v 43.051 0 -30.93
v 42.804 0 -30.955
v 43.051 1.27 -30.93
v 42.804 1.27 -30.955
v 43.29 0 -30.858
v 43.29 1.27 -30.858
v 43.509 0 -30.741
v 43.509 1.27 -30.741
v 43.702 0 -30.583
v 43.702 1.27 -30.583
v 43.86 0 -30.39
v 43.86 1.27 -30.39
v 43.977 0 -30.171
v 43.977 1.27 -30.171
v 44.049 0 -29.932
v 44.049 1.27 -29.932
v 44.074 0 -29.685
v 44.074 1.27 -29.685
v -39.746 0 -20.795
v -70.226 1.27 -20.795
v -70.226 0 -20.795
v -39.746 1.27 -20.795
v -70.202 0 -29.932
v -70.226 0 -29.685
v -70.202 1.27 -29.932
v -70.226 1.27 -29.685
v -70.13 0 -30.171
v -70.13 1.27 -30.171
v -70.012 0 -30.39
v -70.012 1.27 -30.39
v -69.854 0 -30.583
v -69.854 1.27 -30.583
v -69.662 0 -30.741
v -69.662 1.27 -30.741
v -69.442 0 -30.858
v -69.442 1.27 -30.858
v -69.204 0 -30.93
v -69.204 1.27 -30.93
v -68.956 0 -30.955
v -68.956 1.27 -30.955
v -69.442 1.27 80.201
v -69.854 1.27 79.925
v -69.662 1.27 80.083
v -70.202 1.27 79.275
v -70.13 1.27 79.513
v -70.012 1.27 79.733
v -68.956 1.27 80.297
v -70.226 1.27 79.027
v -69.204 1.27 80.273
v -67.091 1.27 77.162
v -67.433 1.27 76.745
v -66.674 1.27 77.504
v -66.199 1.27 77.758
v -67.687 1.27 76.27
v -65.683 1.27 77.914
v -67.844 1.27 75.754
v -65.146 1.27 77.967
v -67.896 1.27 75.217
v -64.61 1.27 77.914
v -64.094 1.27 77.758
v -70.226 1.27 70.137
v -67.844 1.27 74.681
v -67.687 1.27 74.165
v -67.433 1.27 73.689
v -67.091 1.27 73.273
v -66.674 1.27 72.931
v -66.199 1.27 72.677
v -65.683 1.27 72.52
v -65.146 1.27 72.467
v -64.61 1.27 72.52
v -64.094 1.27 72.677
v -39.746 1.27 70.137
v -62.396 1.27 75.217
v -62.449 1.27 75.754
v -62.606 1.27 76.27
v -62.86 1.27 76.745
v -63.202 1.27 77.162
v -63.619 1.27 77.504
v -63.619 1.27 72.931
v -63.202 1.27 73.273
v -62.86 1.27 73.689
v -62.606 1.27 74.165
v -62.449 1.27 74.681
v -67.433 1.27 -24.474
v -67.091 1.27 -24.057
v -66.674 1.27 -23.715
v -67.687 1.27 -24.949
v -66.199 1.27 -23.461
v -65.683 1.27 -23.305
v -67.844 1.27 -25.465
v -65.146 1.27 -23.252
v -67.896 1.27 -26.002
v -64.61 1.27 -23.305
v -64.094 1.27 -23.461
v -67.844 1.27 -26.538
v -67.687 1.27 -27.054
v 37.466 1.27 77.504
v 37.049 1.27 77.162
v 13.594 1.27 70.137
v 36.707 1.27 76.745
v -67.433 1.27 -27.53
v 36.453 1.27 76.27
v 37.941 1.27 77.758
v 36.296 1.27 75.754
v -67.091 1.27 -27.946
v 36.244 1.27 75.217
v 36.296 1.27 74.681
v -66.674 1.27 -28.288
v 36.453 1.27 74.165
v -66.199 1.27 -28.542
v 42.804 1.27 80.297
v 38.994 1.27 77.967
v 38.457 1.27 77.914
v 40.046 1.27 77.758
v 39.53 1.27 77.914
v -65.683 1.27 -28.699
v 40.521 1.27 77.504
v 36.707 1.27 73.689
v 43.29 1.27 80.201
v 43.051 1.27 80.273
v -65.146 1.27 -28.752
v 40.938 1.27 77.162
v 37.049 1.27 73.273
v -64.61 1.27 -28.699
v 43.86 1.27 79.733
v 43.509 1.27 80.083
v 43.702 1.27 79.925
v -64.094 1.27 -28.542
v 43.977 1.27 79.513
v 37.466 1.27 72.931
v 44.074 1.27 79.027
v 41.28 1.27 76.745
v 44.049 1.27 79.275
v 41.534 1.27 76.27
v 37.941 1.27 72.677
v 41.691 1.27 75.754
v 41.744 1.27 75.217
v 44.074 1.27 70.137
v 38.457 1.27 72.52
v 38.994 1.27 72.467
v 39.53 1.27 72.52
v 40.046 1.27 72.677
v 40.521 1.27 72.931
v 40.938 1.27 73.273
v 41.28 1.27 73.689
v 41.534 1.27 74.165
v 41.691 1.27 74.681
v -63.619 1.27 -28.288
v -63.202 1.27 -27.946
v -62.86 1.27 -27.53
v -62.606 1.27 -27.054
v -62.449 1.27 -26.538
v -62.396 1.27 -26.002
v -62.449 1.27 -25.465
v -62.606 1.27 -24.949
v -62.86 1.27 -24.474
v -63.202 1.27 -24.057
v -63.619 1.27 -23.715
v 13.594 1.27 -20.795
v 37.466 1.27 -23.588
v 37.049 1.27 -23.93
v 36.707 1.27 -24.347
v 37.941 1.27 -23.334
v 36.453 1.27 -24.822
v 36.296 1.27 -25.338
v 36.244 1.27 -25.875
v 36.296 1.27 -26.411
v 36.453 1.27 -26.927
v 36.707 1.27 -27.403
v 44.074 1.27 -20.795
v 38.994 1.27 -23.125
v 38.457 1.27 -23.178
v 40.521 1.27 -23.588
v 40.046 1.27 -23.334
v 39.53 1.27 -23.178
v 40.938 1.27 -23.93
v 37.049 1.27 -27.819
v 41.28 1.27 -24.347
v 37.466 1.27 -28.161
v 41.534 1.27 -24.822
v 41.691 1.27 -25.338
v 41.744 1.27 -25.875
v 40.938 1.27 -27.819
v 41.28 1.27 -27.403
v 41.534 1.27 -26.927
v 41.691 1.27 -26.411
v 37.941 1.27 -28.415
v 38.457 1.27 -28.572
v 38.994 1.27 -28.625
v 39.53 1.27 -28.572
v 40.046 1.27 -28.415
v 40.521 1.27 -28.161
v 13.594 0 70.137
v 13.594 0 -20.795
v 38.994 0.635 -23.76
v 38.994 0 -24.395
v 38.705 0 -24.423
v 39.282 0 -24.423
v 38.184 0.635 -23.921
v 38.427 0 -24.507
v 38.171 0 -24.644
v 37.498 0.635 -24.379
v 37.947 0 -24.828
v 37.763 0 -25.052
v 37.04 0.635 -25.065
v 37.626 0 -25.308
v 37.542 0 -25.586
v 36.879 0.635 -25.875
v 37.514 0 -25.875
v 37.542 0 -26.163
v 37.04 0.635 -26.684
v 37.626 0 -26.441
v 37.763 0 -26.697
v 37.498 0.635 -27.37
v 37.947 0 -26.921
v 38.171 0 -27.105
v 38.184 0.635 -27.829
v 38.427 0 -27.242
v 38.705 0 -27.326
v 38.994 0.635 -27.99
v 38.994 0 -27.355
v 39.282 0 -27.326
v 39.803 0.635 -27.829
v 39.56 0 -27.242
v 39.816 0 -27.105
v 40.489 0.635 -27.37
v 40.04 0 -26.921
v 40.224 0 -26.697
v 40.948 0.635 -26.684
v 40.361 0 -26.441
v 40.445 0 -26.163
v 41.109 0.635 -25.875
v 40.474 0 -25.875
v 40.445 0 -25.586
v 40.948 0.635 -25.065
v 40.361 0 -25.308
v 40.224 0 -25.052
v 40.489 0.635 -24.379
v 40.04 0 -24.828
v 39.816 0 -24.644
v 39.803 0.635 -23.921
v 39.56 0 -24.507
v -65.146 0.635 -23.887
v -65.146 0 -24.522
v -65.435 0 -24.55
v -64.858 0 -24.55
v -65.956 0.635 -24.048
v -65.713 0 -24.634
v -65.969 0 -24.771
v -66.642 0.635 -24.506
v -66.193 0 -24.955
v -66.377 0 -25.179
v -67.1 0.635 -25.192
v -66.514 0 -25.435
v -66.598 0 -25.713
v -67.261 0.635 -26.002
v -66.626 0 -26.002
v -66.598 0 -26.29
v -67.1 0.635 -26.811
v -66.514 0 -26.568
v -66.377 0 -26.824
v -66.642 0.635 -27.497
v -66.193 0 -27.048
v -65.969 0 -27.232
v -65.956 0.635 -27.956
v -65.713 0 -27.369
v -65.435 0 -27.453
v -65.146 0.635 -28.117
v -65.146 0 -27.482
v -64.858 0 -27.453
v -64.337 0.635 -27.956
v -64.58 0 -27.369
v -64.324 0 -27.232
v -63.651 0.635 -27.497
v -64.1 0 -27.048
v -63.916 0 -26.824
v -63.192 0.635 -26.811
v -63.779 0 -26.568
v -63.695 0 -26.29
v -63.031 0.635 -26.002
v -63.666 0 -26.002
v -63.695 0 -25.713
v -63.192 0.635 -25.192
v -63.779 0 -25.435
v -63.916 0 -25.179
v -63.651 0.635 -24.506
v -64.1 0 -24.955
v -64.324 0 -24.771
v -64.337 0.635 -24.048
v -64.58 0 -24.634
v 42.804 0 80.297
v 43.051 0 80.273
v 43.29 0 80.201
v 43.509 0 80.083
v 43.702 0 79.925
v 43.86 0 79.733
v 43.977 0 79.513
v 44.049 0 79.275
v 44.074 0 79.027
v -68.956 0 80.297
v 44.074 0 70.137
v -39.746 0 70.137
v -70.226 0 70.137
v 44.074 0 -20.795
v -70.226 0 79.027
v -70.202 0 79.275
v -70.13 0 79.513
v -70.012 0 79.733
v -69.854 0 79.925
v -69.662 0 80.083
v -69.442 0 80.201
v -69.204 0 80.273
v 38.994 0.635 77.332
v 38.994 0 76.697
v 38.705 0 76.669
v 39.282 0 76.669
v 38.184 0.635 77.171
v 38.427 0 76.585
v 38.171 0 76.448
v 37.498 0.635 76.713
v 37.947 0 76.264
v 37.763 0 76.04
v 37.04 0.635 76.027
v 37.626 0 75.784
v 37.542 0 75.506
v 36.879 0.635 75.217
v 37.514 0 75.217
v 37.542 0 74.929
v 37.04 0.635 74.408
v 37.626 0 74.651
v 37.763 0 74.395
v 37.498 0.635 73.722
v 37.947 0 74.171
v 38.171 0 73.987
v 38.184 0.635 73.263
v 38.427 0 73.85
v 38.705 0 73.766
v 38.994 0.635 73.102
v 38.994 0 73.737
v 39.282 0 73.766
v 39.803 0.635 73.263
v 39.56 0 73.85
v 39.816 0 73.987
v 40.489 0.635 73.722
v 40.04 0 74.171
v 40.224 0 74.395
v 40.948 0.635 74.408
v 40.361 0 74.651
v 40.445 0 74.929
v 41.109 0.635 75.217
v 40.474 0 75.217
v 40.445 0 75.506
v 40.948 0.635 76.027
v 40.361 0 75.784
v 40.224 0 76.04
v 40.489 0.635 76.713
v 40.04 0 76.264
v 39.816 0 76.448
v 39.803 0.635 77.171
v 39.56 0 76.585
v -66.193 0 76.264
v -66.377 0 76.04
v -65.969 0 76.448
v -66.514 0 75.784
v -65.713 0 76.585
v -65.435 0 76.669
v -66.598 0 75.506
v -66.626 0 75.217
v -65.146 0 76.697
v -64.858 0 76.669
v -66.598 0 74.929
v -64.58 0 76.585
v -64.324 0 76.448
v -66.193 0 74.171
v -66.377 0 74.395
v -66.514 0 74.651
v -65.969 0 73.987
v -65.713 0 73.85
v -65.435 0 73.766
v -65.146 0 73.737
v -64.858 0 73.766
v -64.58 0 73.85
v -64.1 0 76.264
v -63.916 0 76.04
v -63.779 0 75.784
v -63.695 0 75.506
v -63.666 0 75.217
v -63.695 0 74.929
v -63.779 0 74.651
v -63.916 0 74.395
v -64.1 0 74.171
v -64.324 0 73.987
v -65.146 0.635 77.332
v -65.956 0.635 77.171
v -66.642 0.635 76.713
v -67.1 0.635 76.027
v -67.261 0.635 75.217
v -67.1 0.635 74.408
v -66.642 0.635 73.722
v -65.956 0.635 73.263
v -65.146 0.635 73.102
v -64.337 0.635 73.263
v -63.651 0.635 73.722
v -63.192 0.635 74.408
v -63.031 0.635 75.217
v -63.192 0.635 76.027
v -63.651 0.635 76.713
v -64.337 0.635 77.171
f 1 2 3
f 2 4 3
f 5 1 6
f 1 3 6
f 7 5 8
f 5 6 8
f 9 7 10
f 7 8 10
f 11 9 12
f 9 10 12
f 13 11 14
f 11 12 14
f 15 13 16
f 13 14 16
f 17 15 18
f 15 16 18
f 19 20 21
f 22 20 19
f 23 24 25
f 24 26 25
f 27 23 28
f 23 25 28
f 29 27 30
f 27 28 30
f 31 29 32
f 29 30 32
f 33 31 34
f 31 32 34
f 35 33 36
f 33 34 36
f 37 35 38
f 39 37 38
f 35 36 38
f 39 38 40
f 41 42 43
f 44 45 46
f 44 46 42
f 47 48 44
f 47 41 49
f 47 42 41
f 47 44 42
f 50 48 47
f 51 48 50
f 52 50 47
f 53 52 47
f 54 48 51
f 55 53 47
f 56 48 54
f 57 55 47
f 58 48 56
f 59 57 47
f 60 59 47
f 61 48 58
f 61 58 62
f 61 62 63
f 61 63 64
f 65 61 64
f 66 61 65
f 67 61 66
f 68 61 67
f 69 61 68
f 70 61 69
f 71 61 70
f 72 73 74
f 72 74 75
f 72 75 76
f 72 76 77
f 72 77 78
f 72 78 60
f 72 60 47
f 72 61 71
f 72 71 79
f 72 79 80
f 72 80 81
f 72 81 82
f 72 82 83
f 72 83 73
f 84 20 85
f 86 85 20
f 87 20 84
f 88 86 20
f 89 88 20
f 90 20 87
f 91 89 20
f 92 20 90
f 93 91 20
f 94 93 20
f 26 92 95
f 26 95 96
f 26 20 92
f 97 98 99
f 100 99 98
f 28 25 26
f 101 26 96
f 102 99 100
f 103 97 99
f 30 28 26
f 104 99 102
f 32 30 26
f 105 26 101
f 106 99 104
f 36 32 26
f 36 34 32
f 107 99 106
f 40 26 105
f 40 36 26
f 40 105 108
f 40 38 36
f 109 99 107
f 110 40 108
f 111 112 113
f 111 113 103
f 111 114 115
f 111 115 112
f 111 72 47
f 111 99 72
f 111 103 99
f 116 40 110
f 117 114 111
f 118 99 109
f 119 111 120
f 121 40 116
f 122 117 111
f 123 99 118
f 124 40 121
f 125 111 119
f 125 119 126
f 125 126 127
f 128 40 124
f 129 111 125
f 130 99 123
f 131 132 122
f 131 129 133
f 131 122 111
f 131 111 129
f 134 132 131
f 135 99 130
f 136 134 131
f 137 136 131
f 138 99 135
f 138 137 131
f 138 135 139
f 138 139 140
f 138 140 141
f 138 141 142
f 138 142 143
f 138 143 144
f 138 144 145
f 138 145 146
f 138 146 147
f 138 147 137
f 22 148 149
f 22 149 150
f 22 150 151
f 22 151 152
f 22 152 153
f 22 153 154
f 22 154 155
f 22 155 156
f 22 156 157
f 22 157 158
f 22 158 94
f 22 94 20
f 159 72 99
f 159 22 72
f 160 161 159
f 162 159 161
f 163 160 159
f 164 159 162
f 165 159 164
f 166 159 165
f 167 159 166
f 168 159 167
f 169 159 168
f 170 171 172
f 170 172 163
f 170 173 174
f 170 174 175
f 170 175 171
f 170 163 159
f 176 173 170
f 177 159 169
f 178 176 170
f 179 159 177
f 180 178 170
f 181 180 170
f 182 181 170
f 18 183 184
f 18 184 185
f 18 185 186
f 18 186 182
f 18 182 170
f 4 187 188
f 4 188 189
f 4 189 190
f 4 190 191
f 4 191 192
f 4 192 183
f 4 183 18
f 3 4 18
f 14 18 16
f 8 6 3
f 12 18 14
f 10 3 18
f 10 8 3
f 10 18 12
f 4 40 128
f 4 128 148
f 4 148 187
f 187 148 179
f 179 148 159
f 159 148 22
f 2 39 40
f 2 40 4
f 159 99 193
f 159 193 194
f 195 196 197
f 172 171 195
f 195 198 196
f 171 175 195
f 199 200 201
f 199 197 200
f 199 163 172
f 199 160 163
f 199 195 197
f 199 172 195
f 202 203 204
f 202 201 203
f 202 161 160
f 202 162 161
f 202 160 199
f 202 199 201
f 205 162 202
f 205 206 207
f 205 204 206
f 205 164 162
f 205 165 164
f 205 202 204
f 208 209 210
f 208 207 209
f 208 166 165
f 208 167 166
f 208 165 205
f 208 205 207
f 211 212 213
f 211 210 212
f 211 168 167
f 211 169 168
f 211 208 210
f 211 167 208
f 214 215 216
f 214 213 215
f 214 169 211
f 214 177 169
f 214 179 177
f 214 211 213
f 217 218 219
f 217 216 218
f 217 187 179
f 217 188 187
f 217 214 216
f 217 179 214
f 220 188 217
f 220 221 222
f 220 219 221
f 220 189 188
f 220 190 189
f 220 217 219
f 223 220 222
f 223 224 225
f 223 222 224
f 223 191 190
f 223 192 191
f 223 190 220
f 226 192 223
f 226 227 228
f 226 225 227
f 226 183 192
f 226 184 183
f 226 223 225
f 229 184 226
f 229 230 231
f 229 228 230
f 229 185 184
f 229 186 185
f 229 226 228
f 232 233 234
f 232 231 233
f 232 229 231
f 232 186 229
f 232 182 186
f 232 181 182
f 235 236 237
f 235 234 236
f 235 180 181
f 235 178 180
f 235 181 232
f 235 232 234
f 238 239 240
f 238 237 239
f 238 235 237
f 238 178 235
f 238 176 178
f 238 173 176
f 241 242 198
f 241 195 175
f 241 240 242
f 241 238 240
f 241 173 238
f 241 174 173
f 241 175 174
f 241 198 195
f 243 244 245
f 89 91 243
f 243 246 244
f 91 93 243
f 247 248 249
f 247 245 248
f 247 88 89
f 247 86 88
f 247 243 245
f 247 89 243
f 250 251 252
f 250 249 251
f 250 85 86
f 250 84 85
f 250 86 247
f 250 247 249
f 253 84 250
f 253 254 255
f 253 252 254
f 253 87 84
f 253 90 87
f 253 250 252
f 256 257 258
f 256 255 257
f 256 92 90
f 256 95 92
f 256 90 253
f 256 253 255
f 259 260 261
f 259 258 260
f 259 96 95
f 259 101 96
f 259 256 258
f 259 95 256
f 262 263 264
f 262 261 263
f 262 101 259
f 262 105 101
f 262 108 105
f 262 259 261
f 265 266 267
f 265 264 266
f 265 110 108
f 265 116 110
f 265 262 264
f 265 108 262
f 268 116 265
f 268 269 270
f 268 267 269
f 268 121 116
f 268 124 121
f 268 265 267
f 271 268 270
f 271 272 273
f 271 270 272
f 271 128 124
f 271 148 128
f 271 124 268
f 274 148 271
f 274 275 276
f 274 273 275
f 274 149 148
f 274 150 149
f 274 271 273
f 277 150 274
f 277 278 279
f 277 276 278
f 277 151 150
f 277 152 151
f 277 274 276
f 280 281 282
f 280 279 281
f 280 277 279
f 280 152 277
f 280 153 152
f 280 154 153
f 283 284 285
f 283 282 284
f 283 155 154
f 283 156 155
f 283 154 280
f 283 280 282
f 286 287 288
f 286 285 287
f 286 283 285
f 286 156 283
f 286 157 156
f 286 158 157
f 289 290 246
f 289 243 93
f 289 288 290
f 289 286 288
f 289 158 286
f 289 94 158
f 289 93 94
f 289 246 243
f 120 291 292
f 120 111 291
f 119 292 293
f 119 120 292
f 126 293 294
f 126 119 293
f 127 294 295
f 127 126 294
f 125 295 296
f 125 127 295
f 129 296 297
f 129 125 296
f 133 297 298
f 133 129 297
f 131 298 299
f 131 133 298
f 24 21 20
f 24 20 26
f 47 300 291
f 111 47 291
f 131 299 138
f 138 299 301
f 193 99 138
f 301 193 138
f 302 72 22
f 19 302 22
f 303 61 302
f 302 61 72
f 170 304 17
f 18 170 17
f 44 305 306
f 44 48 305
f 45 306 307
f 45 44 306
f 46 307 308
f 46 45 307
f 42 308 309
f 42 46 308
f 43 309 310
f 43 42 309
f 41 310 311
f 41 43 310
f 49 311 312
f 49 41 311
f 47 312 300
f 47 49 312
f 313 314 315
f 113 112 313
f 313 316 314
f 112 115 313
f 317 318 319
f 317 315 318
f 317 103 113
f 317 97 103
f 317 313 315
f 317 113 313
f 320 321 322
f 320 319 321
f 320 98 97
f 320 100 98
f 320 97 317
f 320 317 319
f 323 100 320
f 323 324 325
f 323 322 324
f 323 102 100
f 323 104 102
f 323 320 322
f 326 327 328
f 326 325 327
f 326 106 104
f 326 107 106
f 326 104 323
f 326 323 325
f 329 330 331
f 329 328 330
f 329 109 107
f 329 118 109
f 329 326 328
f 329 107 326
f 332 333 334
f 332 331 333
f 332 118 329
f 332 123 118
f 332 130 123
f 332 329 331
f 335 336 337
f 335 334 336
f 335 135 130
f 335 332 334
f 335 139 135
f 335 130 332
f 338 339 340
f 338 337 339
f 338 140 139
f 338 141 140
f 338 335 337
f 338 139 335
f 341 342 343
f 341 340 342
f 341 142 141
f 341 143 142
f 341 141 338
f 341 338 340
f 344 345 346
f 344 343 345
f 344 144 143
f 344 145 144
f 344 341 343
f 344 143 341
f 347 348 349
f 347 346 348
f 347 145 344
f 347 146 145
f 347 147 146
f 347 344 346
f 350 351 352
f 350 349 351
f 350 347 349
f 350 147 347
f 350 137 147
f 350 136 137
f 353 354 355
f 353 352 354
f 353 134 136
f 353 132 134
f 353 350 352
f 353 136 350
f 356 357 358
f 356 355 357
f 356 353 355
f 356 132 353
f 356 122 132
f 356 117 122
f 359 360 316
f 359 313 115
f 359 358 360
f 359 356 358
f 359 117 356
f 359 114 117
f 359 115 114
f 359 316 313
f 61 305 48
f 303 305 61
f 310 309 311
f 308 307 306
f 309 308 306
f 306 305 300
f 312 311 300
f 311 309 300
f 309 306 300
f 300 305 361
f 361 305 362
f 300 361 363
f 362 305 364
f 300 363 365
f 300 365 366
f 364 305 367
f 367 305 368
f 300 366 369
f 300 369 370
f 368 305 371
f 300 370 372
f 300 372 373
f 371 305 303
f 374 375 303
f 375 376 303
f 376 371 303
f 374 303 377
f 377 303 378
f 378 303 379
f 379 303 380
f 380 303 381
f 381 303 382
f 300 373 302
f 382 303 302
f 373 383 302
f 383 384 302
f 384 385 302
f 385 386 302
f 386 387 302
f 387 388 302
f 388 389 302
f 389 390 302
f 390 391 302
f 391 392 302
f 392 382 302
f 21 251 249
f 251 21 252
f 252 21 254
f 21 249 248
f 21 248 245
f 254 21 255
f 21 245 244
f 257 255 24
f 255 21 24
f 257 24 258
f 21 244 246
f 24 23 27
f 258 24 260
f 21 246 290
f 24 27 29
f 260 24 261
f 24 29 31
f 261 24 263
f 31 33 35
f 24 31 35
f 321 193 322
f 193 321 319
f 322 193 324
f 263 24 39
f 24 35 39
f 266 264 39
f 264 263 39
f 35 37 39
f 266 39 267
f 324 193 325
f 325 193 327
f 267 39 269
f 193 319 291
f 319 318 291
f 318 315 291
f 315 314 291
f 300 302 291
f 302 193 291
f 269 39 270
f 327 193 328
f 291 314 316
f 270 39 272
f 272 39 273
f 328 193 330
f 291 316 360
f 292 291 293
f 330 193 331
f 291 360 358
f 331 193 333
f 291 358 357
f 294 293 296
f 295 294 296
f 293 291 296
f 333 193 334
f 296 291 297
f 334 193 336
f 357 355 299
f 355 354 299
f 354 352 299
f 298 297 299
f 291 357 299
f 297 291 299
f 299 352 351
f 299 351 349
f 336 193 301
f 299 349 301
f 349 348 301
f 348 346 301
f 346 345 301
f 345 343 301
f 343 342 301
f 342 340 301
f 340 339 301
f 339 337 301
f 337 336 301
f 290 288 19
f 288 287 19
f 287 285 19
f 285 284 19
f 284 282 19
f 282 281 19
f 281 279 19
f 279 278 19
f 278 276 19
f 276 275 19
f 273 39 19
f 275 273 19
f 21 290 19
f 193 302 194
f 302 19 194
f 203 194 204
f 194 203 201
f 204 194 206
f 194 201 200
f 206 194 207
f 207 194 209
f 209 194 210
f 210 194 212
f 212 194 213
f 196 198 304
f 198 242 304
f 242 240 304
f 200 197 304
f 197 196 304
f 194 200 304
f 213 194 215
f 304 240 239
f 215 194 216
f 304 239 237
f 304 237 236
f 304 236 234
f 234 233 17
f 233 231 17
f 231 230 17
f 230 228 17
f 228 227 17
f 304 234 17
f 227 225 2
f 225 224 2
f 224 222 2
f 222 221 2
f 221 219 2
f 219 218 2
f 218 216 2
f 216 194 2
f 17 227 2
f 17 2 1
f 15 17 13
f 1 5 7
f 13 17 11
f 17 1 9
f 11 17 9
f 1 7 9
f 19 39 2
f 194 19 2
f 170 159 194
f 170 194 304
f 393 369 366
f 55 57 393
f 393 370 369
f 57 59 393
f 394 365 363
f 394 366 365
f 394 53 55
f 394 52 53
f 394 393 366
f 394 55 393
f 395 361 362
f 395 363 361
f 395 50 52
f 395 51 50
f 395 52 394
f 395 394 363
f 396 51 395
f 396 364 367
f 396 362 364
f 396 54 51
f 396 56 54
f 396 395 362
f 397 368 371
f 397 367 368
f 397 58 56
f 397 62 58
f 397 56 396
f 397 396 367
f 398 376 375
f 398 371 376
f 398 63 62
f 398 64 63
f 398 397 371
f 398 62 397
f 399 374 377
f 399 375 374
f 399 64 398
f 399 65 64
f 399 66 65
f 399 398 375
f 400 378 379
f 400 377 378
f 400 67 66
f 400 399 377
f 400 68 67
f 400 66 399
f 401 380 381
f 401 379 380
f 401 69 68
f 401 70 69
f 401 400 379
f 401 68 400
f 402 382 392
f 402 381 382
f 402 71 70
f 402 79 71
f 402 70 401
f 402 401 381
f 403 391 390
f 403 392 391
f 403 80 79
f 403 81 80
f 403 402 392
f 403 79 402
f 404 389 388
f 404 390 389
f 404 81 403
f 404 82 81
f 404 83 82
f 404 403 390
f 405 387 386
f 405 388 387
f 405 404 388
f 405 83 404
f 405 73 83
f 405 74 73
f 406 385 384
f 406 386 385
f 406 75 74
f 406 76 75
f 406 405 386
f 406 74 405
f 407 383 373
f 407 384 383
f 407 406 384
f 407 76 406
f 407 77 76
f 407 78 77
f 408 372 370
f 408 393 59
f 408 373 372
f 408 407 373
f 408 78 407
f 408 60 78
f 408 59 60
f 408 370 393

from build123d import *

# Parameters (mm, degrees)
SKETCH1_W                                    = 114.3
SKETCH1_H                                    = 111.252
BOSS_EXTRUDE1_DEPTH                          = 1.27
CSK_FOR_M2_5_COUNTERSUNK_FLAT_HEAD_S_2_COUNT = 2
CSK_FOR_M2_5_COUNTERSUNK_FLAT_HEAD_S_2_PITCH = 104.140077439
CSK_FOR_M2_5_COUNTERSUNK_FLAT_HEAD_S_3_COUNT = 2
CSK_FOR_M2_5_COUNTERSUNK_FLAT_HEAD_S_3_PITCH = 145.225430146
CSK_FOR_M2_5_COUNTERSUNK_FLAT_HEAD_S_4_COUNT = 2
CSK_FOR_M2_5_COUNTERSUNK_FLAT_HEAD_S_4_PITCH = 101.219
FILLET1_R                                    = 1.27
SKETCH9_W                                    = 30.48
SKETCH9_H                                    = 90.932
CUT_EXTRUDE5_DEPTH                           = 5.08


with BuildPart() as part:
    # Sketch1 → Boss-Extrude1 (new body)
    with BuildSketch(Plane(origin=(0, 0, 0), x_dir=(1, 0, 0), z_dir=(0, 1, 0))):
        with Locations((-13.076419672, -24.671311475)):
            Rectangle(SKETCH1_W, SKETCH1_H)
    extrude(amount=BOSS_EXTRUDE1_DEPTH)

    # Sketch3 → CSK for M2.5 Countersunk Flat Head Screw1 (revolve, cut)
    with BuildSketch(Plane(origin=(-65.146419672, 1.27, -26.001688525), x_dir=(0, 0, 1), z_dir=(1, 0, 0))):
        Polygon((0, 0), (0, 1.27), (1.45, 1.27), (1.45, 1.3), (2.75, 0), align=None)
    csk_for_m2_5_countersunk_flat_head_screw = revolve(axis=Axis((-65.146419672, 7.62, -26.001688525), (0, -1, 0)), mode=Mode.SUBTRACT)

    # CSK for M2.5 Countersunk Flat Head S 2: CSK for M2.5 Countersunk Flat Head Screw1 ×2
    with Locations(*[Vector(0.9999992563958324, 0, 0.0012195112882876242) * (i * CSK_FOR_M2_5_COUNTERSUNK_FLAT_HEAD_S_2_PITCH) for i in range(1, CSK_FOR_M2_5_COUNTERSUNK_FLAT_HEAD_S_2_COUNT)]):
        add(csk_for_m2_5_countersunk_flat_head_screw, mode=Mode.SUBTRACT)

    # CSK for M2.5 Countersunk Flat Head S 3: CSK for M2.5 Countersunk Flat Head Screw1 ×2
    with Locations(*[Vector(0.7170920402544414, 0, 0.6969784830277923) * (i * CSK_FOR_M2_5_COUNTERSUNK_FLAT_HEAD_S_3_PITCH) for i in range(1, CSK_FOR_M2_5_COUNTERSUNK_FLAT_HEAD_S_3_COUNT)]):
        add(csk_for_m2_5_countersunk_flat_head_screw, mode=Mode.SUBTRACT)

    # CSK for M2.5 Countersunk Flat Head S 4: CSK for M2.5 Countersunk Flat Head Screw1 ×2
    with Locations(*[(0, 0, i * CSK_FOR_M2_5_COUNTERSUNK_FLAT_HEAD_S_4_PITCH) for i in range(1, CSK_FOR_M2_5_COUNTERSUNK_FLAT_HEAD_S_4_COUNT)]):
        add(csk_for_m2_5_countersunk_flat_head_screw, mode=Mode.SUBTRACT)

    # Fillet1
    fillet1_edges = [part.edges().sort_by_distance(p)[0] for p in [
        (-70.226419672, 0.635, -30.954688525),
        (44.073580328, 0.635, -30.954688525),
        (44.073580328, 0.635, 80.297311475),
        (-70.226419672, 0.635, 80.297311475),
    ]]
    fillet(fillet1_edges, radius=FILLET1_R)

    # Sketch9 → Cut-Extrude5 (cut)
    with BuildSketch(Plane(origin=(0, 1.27, 0), x_dir=(1, 0, 0), z_dir=(0, 1, 0))):
        with Locations((28.833580328, -24.671311475)):
            Rectangle(SKETCH9_W, SKETCH9_H)
        with Locations((-54.986419672, -24.671311475)):
            Rectangle(SKETCH9_W, SKETCH9_H)
    extrude(amount=-CUT_EXTRUDE5_DEPTH, mode=Mode.SUBTRACT)


solid = part.part
